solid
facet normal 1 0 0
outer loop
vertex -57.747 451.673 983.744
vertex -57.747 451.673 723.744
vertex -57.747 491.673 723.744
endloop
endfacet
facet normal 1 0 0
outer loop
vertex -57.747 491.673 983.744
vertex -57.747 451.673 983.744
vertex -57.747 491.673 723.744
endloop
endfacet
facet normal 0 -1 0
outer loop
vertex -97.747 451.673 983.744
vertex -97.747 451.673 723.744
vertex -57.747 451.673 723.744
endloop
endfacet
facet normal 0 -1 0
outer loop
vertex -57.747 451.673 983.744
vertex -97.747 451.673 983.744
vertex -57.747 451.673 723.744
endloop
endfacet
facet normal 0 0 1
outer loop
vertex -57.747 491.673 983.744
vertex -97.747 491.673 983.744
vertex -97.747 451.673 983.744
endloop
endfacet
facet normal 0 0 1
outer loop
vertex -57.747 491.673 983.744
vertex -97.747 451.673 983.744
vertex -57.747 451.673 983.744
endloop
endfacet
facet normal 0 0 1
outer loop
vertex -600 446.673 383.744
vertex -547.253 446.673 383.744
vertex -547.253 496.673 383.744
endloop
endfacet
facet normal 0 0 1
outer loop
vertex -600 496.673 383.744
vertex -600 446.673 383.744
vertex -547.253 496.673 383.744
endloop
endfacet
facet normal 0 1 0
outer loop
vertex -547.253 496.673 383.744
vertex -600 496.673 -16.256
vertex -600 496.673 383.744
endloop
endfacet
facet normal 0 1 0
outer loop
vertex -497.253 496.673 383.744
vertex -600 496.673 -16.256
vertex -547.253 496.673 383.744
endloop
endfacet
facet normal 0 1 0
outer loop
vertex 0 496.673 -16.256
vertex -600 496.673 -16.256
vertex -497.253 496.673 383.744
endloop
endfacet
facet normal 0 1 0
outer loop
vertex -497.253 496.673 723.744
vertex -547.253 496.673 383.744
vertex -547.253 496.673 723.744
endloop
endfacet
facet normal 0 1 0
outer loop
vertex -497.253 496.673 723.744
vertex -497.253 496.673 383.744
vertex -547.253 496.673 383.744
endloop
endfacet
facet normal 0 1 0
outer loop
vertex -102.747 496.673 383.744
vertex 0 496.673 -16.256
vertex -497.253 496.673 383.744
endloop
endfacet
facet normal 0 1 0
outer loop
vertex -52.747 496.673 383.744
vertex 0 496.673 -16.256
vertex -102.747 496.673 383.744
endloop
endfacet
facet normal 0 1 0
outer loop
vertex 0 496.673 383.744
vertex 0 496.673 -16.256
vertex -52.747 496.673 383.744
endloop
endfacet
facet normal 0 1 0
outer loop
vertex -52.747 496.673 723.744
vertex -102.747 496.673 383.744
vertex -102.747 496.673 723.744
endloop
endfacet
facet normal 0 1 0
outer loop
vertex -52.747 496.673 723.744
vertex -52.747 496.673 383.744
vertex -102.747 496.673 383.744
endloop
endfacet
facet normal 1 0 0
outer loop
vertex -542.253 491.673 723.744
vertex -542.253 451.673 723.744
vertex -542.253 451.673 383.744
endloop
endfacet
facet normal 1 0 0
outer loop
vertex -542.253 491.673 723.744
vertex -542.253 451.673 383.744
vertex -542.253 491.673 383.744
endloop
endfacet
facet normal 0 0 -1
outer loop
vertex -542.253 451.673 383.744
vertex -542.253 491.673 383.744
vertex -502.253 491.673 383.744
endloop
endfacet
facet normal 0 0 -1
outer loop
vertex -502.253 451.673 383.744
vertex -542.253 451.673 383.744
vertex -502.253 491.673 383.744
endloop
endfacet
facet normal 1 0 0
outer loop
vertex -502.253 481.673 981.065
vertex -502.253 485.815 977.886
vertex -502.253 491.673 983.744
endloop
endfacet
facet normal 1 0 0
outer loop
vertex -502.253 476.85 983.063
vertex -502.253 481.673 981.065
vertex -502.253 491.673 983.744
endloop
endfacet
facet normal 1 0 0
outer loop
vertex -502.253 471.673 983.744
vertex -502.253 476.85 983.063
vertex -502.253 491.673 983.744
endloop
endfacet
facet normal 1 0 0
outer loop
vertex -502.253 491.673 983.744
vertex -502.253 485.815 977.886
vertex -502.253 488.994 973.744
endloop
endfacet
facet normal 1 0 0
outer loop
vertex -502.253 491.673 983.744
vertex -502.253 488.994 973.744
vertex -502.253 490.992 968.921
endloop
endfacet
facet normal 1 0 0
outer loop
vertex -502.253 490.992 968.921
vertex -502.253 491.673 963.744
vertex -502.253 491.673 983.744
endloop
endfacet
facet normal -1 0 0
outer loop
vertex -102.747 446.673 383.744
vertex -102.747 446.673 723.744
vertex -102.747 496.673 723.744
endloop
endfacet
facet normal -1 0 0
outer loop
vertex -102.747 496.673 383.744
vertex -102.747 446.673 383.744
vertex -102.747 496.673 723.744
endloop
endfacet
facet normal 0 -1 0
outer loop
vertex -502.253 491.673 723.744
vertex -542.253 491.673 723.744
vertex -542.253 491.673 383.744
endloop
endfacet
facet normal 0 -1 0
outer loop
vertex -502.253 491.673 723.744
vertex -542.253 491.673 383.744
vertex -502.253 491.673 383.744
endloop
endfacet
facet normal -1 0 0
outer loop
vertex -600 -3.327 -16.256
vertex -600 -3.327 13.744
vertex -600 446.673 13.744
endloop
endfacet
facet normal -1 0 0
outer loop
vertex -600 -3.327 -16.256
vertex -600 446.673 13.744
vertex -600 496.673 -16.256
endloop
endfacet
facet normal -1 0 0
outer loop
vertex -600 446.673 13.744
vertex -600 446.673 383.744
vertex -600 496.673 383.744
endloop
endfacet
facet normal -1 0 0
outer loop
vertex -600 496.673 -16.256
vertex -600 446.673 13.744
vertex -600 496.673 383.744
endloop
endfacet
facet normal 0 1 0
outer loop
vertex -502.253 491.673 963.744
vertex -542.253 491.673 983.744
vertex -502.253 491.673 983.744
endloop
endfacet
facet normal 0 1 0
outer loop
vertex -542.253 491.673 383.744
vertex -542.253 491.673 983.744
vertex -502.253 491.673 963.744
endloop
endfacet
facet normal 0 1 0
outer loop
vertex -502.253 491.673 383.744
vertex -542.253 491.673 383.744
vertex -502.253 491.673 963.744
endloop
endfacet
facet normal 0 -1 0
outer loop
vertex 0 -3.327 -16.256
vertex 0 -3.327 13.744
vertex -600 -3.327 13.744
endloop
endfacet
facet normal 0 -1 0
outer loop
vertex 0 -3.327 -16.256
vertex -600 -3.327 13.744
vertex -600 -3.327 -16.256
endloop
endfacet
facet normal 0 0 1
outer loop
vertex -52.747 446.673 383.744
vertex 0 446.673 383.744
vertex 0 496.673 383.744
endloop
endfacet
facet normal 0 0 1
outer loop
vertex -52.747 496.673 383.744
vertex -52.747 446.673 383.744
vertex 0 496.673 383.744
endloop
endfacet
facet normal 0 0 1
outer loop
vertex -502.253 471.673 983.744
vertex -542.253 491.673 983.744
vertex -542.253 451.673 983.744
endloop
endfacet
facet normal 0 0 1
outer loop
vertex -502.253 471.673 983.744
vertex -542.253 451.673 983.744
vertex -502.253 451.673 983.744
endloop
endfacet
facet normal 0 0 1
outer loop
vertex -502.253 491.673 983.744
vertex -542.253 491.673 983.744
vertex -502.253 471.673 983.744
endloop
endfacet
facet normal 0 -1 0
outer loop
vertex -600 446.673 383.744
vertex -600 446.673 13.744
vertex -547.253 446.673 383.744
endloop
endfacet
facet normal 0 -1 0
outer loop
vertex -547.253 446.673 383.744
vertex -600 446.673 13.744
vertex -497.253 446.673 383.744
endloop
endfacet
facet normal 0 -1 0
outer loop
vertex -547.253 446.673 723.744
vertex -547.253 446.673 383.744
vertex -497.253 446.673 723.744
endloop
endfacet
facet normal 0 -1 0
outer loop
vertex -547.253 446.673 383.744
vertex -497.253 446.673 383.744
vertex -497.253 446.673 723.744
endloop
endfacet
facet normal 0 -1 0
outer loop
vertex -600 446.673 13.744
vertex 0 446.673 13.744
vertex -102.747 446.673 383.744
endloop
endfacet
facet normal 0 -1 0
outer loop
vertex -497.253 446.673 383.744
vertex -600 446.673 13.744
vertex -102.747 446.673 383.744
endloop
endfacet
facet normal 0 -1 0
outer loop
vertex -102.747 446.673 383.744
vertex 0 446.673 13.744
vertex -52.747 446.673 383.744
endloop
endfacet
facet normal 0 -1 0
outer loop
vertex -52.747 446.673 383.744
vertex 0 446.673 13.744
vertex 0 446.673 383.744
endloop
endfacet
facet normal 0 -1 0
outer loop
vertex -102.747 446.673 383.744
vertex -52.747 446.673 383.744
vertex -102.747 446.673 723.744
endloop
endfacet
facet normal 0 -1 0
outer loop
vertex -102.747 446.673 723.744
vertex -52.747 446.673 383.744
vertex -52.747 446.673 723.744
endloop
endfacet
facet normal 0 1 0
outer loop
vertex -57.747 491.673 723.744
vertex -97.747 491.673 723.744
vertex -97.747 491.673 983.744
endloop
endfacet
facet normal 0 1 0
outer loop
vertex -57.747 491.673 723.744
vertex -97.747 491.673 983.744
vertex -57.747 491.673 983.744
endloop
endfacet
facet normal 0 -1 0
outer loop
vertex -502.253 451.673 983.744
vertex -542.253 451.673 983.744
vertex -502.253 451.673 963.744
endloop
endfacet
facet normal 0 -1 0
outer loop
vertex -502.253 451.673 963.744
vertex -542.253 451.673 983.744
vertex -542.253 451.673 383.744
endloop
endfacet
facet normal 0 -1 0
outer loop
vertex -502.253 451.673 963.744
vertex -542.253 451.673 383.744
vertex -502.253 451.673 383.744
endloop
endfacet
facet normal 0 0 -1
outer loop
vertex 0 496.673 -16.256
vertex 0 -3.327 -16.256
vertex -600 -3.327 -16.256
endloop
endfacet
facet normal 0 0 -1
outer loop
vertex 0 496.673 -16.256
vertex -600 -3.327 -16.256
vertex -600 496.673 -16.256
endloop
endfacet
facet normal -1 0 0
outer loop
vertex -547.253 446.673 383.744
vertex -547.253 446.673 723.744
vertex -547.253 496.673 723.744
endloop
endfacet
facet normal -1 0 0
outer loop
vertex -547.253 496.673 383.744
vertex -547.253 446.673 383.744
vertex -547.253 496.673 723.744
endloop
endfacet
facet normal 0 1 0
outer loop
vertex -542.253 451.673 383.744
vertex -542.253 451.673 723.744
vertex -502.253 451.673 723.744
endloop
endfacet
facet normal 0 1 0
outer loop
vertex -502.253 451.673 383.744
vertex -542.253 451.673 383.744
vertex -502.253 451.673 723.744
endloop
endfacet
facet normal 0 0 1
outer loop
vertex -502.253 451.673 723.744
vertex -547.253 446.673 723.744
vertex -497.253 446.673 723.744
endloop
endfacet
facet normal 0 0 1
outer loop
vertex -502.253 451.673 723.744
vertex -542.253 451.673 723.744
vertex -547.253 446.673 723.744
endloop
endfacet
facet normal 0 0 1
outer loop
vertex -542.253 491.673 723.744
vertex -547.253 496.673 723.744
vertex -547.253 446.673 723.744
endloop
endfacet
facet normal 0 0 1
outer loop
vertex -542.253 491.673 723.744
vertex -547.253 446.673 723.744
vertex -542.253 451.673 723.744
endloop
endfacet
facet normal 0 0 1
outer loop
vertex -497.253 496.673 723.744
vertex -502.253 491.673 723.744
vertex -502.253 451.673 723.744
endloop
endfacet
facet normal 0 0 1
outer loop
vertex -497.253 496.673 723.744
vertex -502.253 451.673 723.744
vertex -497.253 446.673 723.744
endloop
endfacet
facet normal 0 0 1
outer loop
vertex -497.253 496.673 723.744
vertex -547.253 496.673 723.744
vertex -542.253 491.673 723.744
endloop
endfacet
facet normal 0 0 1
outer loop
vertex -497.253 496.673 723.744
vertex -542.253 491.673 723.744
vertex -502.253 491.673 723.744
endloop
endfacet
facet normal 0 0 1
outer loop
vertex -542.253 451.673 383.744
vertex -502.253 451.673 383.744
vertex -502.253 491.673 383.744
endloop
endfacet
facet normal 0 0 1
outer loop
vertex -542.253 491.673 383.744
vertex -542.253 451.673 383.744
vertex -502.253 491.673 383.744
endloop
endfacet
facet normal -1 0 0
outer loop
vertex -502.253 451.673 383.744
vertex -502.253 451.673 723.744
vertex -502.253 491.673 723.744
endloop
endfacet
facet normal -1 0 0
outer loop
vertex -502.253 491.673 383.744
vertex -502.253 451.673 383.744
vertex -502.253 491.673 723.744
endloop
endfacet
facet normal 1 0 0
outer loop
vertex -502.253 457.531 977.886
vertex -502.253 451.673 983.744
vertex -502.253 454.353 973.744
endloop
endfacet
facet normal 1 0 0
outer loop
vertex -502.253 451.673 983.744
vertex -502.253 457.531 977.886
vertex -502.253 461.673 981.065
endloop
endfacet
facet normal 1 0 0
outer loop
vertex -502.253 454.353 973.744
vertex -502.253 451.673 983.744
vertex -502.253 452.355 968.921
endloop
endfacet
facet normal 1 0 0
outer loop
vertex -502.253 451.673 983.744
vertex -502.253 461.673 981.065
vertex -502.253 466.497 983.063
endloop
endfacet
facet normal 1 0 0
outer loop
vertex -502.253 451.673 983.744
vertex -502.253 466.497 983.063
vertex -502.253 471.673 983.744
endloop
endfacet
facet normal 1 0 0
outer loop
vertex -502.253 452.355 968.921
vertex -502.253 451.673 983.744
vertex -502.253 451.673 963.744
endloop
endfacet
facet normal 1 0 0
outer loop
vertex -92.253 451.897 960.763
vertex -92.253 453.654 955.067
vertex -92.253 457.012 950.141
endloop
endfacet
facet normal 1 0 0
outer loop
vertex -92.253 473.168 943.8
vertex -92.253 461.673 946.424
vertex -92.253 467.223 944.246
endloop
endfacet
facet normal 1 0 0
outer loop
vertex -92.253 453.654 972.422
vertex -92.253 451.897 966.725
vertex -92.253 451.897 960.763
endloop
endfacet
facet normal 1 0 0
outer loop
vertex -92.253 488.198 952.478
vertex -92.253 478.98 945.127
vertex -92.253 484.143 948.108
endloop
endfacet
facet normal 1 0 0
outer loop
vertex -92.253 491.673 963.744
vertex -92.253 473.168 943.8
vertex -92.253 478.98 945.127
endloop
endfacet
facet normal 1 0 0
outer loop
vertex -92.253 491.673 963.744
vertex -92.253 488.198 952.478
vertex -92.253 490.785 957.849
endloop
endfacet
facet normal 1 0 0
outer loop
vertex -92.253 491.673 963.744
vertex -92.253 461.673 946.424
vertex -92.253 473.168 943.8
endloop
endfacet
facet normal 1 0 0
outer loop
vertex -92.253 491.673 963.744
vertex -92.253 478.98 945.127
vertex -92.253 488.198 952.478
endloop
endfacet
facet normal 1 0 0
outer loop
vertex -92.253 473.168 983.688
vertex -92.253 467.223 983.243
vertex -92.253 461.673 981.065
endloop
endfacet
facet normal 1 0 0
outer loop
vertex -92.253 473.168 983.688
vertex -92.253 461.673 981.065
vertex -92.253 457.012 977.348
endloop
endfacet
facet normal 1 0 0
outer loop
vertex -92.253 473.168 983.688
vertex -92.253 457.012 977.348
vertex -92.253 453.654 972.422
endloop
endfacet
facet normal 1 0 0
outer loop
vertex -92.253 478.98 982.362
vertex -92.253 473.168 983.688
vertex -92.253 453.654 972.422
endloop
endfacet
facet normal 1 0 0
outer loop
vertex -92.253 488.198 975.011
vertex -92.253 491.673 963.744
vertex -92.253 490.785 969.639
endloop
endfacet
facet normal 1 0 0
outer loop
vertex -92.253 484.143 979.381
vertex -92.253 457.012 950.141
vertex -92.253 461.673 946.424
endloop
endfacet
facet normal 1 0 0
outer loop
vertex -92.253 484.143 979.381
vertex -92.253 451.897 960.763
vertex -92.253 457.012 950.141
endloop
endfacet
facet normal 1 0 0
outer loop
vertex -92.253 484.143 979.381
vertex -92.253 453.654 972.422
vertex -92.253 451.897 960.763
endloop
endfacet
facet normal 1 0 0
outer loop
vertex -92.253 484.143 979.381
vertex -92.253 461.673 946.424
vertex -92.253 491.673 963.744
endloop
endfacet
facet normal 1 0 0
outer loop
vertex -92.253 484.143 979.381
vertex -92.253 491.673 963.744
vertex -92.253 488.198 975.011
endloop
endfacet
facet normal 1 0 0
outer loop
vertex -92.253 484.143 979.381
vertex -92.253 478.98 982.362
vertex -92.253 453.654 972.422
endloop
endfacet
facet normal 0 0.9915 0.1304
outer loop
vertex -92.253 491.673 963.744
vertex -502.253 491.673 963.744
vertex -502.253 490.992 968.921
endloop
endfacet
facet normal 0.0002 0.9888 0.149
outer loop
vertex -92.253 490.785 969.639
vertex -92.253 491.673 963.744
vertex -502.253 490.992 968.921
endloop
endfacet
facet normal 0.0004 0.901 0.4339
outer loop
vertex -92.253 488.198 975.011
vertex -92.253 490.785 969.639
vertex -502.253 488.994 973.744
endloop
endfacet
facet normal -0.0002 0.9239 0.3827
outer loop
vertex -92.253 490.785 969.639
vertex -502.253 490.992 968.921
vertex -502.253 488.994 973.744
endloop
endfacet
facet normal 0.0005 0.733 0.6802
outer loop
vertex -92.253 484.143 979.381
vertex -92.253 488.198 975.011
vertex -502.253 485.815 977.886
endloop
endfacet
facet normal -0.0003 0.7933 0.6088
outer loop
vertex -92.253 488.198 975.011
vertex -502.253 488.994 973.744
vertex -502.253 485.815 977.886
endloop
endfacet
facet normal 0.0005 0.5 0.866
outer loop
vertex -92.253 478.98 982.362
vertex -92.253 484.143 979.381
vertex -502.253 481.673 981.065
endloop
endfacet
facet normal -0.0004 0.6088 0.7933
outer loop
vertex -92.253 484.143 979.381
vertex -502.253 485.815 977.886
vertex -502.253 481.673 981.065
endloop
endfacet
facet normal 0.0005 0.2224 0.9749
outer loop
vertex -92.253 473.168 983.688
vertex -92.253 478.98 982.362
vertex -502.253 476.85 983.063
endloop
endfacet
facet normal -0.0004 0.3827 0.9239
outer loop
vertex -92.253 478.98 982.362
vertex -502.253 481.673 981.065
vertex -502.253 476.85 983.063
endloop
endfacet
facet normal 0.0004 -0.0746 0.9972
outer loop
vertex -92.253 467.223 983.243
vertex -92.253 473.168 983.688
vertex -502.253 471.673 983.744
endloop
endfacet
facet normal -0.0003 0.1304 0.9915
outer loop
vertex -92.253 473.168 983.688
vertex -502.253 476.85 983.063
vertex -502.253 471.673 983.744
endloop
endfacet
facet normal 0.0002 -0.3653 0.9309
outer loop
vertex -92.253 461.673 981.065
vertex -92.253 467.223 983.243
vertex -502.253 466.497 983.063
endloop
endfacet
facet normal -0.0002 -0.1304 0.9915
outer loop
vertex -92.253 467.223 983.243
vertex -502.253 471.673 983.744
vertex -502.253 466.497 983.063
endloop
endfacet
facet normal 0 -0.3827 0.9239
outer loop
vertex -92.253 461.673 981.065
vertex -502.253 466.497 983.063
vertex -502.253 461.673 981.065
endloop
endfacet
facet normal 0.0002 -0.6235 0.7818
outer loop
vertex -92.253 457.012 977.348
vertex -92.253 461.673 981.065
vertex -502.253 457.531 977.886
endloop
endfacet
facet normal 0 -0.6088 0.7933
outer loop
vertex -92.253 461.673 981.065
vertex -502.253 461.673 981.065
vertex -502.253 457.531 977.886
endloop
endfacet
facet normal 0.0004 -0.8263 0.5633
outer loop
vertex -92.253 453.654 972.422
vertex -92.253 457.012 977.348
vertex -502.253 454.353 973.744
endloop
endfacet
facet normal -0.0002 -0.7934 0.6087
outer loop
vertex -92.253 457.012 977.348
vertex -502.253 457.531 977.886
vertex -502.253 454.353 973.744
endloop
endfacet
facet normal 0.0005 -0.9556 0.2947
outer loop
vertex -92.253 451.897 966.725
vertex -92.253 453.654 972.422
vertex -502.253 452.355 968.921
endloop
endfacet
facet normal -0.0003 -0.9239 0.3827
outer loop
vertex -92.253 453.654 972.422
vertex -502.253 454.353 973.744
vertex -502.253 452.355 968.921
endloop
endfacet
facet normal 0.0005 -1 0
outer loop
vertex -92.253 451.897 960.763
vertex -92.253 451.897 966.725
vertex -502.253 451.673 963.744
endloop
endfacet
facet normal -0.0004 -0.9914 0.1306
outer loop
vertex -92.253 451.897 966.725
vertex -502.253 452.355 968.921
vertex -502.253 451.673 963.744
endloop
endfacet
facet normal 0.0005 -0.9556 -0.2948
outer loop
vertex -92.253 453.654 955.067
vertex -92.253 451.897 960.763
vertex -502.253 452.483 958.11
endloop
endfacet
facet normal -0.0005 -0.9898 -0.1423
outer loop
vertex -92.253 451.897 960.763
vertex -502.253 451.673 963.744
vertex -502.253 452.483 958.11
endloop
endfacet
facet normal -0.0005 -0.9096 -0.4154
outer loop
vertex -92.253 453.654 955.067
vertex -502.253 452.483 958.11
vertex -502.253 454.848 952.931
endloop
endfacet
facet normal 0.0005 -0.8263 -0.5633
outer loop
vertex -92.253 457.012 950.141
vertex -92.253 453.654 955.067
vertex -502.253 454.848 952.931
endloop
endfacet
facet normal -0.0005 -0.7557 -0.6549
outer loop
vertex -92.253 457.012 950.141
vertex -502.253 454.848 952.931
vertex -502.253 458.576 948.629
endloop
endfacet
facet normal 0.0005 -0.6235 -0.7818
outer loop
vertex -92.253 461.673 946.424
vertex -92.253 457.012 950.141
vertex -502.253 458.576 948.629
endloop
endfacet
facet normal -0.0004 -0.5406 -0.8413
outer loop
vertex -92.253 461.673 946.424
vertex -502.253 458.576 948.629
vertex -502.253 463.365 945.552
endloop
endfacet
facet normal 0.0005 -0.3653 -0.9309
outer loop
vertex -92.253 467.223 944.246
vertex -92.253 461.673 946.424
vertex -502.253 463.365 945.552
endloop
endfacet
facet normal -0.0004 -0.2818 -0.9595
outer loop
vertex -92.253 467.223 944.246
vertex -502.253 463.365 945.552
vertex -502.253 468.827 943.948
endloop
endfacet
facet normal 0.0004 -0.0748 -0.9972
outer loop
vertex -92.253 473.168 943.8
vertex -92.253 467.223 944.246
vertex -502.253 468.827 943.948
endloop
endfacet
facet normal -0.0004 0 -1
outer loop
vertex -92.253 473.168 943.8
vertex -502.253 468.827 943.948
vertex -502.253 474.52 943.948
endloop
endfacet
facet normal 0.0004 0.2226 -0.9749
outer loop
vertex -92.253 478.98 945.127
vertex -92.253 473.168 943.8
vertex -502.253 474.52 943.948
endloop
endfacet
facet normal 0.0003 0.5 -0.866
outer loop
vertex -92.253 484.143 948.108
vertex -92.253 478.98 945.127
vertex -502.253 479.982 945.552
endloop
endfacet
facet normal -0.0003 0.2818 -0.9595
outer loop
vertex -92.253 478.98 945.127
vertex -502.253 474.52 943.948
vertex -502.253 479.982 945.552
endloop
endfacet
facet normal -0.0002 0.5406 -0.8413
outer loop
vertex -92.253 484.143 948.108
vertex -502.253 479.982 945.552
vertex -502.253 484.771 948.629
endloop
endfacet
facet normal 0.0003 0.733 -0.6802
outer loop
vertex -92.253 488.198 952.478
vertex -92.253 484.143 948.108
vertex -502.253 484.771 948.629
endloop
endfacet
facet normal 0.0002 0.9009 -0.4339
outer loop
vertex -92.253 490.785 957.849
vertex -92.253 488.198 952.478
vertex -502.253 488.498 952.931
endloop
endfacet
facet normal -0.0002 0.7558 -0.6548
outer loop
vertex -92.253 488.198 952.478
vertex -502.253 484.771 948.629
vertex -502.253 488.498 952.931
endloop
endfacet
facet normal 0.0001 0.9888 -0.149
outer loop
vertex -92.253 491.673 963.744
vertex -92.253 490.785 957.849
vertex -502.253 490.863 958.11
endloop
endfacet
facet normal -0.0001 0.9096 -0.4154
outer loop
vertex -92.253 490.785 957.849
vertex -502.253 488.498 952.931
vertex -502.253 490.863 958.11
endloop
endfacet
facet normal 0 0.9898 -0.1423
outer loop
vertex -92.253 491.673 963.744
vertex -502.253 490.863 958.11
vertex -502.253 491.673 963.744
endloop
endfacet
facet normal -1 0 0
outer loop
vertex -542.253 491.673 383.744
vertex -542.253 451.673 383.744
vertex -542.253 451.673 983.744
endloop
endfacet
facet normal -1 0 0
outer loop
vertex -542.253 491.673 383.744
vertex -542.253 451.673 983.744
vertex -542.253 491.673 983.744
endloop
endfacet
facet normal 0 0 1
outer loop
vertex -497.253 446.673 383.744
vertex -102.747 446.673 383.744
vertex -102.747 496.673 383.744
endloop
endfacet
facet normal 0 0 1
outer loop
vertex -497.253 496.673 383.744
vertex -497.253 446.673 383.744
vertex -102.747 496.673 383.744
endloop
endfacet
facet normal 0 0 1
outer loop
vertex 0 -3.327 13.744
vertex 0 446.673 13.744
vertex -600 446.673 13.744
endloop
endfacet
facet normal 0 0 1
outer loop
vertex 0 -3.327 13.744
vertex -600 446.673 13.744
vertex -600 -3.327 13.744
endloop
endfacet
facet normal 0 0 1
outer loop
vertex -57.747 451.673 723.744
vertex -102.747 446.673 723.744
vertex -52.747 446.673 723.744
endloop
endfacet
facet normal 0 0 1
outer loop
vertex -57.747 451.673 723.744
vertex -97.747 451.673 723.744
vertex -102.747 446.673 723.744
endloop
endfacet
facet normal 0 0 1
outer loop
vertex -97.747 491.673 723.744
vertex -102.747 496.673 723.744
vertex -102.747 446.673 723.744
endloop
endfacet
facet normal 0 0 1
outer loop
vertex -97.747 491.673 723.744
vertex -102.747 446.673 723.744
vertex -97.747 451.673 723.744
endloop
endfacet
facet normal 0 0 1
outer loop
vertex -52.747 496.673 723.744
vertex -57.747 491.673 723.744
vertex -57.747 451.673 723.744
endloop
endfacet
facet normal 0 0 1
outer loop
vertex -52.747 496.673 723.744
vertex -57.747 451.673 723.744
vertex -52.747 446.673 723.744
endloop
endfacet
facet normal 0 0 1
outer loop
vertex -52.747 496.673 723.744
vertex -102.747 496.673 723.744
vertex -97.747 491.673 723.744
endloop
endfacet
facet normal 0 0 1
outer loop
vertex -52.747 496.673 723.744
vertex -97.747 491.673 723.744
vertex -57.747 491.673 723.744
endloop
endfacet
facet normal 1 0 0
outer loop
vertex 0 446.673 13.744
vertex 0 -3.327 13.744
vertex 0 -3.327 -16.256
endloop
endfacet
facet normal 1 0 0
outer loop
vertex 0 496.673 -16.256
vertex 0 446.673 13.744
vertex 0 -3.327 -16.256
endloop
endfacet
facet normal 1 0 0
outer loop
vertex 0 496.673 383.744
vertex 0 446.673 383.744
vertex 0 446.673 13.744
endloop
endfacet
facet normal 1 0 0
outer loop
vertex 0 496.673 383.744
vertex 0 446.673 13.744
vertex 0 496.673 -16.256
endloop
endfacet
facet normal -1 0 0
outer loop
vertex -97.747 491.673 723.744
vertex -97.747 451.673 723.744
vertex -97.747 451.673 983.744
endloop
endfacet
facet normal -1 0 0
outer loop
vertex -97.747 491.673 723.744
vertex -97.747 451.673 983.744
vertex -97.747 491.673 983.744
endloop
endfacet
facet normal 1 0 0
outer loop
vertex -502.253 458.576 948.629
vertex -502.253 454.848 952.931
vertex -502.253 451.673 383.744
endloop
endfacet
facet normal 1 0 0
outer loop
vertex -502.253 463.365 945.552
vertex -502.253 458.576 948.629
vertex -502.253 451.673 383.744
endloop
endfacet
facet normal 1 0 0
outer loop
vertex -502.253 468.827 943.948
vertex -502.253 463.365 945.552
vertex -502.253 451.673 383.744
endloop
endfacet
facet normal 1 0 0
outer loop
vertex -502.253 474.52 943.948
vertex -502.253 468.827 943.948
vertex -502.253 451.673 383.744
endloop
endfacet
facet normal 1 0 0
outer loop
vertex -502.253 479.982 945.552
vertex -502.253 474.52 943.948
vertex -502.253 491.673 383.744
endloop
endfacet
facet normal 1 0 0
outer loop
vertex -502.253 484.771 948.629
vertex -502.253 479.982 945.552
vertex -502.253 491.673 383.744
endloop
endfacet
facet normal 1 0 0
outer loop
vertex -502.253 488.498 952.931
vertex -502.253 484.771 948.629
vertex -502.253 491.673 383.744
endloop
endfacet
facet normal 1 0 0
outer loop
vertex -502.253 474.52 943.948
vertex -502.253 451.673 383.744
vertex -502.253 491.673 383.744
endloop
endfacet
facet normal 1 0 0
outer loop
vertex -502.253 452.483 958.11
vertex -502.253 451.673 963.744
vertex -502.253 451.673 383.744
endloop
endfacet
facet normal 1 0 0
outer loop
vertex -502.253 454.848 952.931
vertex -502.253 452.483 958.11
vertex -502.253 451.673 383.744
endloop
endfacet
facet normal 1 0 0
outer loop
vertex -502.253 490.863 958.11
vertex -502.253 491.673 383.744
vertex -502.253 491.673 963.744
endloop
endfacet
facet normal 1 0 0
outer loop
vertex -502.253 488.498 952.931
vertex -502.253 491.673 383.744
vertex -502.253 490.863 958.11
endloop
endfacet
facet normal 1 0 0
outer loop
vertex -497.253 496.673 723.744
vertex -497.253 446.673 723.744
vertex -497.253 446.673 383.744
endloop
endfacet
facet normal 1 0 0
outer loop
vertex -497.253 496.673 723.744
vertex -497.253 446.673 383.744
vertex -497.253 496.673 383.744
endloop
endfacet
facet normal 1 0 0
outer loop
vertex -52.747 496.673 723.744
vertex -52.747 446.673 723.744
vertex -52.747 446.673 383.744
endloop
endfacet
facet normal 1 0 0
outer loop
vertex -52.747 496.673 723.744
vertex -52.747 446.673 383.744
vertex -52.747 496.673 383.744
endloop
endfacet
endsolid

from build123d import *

# Parameters (mm, degrees)
F0_W     = 50
F0_H     = 370
F1_DEPTH = 600
F2_W     = 50
F2_H     = 50
F2_W_2   = 40
F2_H_2   = 40
F3_DEPTH = 340
F4_DEPTH = 340
F5_DEPTH = 600
F6_DEPTH = 600
F7_R     = 20
F8_DEPTH = 410


with BuildPart() as f1:
    # F0 (on Right) → F1 (new body)
    with BuildSketch(Plane.YZ):
        with Locations((471.6733521096, 198.7442690134)):
            Rectangle(F0_W, F0_H)
        Polygon((446.6733521096, 13.7442690134), (-3.3266478904, 13.7442690134), (-3.3266478904, -16.2557309866), (496.6733521096, -16.2557309866), (496.6733521096, 13.7442690134), align=None)
    extrude(amount=-F1_DEPTH)

    # F2 (on face) → F3 (join)
    with BuildSketch(Plane.XY.offset(383.7442690134)):
        with Locations((-522.2534894943, 471.6733521096)):
            Rectangle(F2_W, F2_H)
        with Locations((-522.2534894943, 471.6733521096)):
            Rectangle(F2_W_2, F2_H_2, mode=Mode.SUBTRACT)
    extrude(amount=F3_DEPTH)

    # F2 (on face) → F4 (join)
    with BuildSketch(Plane.XY.offset(383.7442690134)):
        with Locations((-77.7465105057, 471.6733521096)):
            Rectangle(F2_W, F2_H)
        with Locations((-77.7465105057, 471.6733521096)):
            Rectangle(F2_W_2, F2_H_2, mode=Mode.SUBTRACT)
    extrude(amount=F4_DEPTH)

    # F2 (on face) → F6 (join)
    with BuildSketch(Plane.XY.offset(383.7442690134)):
        with Locations((-77.7465105057, 471.6733521096)):
            Rectangle(F2_W_2, F2_H_2)
    extrude(amount=F6_DEPTH)


with BuildPart() as f5:
    # F2 (on face) → F5 (new body)
    with BuildSketch(Plane.XY.offset(383.7442690134)):
        with Locations((-522.2534894943, 471.6733521096)):
            Rectangle(F2_W_2, F2_H_2)
    extrude(amount=F5_DEPTH)

    # F7 (on face) → F8 (join)
    with BuildSketch(Plane.YZ.offset(-502.2534894943)):
        with Locations((471.6733521096, 963.7442690134)):
            Circle(F7_R)
    extrude(amount=F8_DEPTH)


solid = Compound([f1.part, f5.part])
